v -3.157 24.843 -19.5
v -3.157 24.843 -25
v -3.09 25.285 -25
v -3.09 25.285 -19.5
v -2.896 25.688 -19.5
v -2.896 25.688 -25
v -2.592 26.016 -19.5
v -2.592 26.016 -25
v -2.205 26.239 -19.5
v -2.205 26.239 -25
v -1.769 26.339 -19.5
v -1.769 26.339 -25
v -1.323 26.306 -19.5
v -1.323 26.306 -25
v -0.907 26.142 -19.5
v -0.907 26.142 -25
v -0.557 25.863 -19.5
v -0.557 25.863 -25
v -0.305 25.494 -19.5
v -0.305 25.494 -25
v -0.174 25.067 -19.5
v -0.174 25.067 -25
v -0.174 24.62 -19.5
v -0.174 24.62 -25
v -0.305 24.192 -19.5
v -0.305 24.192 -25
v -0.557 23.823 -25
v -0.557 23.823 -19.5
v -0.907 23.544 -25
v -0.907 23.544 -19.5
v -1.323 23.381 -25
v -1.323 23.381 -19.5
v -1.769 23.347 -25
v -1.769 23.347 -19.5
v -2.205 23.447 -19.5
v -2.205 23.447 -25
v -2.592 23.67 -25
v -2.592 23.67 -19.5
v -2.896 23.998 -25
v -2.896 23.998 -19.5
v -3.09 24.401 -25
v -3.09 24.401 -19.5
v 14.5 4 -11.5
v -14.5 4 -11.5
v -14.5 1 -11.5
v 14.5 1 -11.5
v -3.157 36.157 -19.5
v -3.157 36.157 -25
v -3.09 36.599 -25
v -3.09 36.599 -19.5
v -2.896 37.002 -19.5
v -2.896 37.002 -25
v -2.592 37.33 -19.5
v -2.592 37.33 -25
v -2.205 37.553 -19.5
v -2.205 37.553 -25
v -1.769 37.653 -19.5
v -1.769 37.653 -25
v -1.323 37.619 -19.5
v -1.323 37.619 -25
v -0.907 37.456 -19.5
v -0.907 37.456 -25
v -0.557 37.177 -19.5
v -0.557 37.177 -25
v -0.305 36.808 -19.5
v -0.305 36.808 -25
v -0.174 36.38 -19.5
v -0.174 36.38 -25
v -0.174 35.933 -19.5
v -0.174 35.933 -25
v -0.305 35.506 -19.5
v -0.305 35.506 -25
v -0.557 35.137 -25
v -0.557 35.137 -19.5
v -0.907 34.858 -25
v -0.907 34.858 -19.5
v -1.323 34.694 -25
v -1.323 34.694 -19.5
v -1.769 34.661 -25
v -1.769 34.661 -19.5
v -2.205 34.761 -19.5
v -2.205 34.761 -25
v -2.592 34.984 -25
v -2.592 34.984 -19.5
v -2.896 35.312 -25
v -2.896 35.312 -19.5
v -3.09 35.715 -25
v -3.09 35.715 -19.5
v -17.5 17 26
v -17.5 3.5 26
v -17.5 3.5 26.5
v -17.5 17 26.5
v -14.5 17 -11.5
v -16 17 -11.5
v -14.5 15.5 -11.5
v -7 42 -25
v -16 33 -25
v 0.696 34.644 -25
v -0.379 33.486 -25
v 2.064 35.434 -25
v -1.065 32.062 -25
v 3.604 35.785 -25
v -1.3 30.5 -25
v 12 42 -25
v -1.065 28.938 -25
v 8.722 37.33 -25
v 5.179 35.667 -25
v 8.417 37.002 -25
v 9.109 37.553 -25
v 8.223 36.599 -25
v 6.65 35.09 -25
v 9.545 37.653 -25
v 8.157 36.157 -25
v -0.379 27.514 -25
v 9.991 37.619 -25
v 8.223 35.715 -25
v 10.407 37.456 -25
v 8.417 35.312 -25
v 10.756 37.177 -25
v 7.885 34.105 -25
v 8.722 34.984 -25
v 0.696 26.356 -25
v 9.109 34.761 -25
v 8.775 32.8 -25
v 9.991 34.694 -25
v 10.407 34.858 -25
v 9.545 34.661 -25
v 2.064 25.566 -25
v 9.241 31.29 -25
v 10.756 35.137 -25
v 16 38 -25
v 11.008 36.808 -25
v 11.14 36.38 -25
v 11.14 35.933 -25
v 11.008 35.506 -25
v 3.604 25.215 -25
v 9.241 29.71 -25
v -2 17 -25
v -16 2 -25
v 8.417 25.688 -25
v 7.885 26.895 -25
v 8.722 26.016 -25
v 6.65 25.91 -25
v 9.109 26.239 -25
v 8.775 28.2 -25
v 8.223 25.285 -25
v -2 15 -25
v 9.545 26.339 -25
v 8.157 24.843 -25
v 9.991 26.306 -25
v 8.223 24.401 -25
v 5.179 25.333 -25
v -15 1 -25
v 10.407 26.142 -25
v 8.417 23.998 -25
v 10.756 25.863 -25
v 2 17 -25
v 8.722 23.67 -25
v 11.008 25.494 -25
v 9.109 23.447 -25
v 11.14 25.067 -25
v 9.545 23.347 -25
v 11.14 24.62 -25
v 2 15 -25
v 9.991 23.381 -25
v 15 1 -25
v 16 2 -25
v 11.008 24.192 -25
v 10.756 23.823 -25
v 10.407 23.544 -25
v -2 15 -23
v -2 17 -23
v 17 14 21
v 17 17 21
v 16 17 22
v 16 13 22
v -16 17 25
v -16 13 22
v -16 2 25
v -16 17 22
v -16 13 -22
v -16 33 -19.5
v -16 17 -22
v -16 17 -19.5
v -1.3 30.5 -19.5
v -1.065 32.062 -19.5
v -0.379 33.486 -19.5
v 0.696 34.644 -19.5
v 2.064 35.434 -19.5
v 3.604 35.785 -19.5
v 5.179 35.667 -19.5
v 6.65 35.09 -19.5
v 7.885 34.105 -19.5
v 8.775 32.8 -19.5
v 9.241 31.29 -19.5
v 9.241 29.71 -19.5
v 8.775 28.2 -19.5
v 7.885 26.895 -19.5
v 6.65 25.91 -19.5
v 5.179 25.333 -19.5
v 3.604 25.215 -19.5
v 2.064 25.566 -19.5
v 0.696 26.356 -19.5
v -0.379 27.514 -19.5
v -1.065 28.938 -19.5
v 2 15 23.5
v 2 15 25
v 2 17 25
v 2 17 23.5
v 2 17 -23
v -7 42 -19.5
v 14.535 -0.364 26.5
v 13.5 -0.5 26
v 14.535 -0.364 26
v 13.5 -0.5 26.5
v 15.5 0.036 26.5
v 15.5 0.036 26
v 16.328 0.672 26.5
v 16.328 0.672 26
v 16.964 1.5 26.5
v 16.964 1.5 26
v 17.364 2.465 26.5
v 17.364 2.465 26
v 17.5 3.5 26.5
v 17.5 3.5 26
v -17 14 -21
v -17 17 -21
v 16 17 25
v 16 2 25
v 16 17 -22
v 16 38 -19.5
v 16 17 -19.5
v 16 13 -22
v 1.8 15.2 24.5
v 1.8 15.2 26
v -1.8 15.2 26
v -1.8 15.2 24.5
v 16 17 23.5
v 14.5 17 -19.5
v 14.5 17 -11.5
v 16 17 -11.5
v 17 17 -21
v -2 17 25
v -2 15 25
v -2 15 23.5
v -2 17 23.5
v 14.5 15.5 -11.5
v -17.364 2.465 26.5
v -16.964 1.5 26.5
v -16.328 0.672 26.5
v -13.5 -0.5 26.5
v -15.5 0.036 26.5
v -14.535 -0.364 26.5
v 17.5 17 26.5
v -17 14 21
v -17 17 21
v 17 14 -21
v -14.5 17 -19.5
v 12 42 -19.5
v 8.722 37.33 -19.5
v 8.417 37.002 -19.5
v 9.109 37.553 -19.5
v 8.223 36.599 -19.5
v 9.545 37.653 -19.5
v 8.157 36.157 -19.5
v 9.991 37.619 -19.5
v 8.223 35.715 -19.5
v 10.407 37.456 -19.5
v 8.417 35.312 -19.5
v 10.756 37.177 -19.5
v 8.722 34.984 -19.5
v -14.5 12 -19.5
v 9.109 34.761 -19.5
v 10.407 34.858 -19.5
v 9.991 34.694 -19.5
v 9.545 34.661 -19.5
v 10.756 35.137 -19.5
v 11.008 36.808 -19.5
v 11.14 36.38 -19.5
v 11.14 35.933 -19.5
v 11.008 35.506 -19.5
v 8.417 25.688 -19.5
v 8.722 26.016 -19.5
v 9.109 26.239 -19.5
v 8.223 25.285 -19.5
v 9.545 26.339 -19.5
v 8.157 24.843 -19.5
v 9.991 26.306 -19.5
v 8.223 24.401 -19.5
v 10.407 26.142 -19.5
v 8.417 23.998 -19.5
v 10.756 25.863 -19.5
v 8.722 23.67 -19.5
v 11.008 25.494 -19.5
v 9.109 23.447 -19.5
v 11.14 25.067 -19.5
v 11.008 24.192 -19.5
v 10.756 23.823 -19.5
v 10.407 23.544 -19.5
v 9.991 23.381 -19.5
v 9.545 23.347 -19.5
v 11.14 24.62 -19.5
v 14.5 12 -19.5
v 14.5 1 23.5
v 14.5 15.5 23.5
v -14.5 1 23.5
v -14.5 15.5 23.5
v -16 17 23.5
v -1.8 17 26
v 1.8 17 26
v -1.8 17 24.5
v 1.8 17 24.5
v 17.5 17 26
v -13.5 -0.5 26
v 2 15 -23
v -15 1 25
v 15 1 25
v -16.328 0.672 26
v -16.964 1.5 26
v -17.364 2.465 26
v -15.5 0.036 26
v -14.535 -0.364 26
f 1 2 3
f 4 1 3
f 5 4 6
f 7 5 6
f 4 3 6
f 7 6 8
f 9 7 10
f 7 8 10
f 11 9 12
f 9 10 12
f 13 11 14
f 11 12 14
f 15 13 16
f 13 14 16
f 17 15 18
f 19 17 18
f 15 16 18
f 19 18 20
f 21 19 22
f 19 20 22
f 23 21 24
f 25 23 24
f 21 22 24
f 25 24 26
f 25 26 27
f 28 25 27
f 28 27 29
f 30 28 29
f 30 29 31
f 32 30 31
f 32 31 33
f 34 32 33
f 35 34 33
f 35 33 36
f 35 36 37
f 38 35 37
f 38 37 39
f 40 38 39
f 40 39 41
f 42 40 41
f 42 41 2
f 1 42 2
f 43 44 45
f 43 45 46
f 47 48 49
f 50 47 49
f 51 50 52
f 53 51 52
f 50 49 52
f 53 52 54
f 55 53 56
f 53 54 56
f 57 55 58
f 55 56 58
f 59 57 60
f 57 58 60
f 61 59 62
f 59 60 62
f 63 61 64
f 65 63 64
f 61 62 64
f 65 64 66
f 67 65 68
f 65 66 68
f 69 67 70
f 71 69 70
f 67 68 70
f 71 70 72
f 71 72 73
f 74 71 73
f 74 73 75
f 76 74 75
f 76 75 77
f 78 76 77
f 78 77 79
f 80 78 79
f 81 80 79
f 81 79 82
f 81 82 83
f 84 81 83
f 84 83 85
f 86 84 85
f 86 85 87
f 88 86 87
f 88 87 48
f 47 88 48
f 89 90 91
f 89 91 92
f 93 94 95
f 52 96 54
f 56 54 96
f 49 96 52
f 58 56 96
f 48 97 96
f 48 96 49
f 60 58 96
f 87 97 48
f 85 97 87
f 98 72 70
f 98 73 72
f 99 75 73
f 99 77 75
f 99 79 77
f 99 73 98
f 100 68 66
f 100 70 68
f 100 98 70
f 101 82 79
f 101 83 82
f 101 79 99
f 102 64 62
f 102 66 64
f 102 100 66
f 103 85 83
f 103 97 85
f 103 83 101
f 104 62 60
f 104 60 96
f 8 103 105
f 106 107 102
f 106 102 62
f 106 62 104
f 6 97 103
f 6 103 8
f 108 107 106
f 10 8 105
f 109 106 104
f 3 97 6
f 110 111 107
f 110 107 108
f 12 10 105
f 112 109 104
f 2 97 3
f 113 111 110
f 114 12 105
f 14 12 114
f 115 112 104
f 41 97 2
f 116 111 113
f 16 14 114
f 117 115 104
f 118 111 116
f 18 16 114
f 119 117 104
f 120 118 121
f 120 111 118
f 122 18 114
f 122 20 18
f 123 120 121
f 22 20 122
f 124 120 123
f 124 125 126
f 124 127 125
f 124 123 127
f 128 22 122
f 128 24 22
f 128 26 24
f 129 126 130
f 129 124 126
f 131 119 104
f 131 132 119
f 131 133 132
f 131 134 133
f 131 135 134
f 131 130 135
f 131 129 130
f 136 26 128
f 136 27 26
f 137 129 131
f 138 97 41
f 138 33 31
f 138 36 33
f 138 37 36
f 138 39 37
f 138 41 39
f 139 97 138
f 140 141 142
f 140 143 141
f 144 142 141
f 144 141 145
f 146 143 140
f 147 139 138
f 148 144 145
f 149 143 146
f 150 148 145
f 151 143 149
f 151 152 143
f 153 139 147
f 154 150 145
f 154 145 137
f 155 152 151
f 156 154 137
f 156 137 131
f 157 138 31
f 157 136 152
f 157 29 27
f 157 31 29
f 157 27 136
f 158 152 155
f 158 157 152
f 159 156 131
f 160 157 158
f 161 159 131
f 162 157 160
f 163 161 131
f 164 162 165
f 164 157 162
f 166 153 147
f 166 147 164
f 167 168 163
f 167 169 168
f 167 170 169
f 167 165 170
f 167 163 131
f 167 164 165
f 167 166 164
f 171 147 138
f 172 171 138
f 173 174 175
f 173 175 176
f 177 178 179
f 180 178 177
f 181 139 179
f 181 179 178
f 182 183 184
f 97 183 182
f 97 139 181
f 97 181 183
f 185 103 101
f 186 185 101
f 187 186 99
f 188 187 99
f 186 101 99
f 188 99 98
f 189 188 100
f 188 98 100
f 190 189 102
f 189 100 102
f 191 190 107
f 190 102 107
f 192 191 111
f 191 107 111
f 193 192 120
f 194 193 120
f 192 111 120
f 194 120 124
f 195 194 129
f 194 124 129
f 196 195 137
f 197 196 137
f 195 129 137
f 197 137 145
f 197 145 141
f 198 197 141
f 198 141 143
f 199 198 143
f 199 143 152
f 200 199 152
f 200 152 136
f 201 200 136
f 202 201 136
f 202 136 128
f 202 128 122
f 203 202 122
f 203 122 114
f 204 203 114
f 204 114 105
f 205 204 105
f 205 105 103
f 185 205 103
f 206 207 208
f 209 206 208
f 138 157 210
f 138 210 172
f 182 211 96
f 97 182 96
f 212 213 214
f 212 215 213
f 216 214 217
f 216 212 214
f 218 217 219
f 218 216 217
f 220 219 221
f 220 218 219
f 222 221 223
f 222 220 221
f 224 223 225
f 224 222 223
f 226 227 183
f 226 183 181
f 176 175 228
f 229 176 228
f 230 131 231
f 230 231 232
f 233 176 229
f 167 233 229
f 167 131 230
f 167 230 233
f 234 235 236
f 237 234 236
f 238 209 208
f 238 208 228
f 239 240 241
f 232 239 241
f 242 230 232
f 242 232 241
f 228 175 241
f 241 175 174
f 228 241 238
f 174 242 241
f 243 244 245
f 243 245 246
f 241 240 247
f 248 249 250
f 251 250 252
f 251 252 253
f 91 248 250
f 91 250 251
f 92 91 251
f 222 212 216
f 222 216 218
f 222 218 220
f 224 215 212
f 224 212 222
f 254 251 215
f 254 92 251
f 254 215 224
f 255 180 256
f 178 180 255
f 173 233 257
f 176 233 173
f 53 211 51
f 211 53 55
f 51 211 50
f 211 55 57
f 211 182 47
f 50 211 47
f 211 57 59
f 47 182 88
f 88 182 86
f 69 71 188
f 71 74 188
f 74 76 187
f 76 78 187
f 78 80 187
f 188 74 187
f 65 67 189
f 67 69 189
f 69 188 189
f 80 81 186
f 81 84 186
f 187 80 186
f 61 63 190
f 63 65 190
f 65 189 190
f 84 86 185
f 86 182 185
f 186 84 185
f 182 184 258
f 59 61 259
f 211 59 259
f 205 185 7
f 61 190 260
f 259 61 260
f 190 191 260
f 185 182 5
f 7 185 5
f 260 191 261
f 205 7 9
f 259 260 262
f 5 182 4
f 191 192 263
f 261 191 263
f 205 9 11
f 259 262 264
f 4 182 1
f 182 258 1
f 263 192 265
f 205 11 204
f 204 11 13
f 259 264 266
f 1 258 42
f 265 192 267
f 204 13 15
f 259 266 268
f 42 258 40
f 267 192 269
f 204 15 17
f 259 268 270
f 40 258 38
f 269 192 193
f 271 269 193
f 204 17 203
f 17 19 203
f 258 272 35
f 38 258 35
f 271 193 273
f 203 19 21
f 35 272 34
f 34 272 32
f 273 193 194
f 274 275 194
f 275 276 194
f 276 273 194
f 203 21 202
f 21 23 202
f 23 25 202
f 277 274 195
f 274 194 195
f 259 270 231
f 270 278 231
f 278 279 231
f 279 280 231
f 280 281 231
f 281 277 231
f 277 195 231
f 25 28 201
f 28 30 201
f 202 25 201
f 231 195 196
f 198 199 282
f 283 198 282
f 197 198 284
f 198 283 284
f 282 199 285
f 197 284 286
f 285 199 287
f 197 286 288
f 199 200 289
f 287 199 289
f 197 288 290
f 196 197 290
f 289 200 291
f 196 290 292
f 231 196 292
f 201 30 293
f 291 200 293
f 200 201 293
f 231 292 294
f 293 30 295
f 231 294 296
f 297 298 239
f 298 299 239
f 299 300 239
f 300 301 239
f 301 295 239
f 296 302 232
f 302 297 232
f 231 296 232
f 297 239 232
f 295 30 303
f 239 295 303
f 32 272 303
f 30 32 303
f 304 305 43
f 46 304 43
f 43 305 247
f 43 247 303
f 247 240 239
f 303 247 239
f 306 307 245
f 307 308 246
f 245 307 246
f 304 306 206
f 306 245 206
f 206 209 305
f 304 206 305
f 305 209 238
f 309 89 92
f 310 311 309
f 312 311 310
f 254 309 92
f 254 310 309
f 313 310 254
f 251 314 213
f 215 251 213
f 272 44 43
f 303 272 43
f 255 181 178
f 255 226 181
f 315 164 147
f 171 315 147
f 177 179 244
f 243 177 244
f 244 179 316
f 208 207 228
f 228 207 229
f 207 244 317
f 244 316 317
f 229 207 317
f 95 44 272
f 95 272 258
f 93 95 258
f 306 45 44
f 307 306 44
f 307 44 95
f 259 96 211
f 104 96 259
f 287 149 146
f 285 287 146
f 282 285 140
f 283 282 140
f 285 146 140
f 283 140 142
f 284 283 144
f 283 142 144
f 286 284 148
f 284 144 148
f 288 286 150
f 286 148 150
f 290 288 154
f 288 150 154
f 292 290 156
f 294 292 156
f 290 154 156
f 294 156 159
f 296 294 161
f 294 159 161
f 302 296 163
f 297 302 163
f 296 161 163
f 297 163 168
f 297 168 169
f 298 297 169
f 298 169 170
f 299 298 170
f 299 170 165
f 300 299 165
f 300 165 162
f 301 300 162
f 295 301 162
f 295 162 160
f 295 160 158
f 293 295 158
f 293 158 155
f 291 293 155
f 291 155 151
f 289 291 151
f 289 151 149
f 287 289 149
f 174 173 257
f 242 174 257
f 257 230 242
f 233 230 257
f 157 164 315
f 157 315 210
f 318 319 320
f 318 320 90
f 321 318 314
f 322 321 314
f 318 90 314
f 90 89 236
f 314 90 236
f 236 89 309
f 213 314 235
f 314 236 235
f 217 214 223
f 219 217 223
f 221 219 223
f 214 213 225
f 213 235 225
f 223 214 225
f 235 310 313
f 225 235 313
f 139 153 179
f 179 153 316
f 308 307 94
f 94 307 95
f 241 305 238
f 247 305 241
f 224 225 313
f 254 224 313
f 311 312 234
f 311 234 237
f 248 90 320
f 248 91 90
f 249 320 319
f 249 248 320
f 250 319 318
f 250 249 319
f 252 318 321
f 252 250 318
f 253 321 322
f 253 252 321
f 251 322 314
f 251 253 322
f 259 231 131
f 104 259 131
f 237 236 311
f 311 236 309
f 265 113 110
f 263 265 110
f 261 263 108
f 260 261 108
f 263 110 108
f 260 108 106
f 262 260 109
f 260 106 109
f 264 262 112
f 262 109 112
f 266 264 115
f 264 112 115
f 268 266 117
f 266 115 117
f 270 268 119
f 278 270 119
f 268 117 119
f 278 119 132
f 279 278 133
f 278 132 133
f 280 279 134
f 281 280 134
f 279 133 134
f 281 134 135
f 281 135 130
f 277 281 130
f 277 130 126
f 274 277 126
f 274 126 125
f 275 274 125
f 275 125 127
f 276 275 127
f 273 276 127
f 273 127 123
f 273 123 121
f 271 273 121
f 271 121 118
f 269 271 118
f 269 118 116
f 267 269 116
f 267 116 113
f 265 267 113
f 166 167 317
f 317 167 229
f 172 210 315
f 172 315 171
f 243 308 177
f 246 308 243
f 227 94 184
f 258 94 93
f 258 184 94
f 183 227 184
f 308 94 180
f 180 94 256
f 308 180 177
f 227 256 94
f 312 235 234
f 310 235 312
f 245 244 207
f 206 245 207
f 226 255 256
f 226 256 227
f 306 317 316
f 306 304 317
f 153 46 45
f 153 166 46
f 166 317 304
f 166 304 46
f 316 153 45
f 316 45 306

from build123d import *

# Parameters (mm, degrees)
SZKIC1_W                    = 34
SZKIC1_H                    = 50
DODANIE_WYCI_GNI_CIE1_DEPTH = 17
SZKIC3_W                    = 34
SZKIC3_H                    = 5.5
DODANIE_WYCI_GNI_CIE2_DEPTH = 25
SZKIC4_R                    = 1.5
SZKIC4_R_2                  = 5.3
WYTNIJ_WYCI_GNI_CIE2_DEPTH  = 25
SFAZOWANIE1_SIZE            = 10
SFAZOWANIE2_SIZE            = 5
WYTNIJ_WYCI_GNI_CIE3_START  = -50
WYTNIJ_WYCI_GNI_CIE3_DEPTH  = 50
SFAZOWANIE3_SIZE            = 1
SFAZOWANIE4_SIZE            = 1
SZKIC7_W                    = 35
SZKIC7_H                    = 17.5
DODANIE_WYCI_GNI_CIE3_DEPTH = 0.5
ZAOKR_GLENIE3_R             = 4
SZKIC8_W                    = 1
SZKIC8_H                    = 3
WYTNIJ_WYCI_GNI_CIE4_DEPTH  = 68
SFAZOWANIE6_SIZE            = 1
SZKIC9_W                    = 29
SZKIC9_H                    = 35
WYTNIJ_WYCI_GNI_CIE5_DEPTH  = 68
SFAZOWANIE7_SIZE            = 1.5
SZKIC10_W                   = 4
SZKIC10_H                   = 4
WYTNIJ_WYCI_GNI_CIE6_DEPTH  = 10
SZKIC11_W                   = 3.6
SZKIC11_H                   = 1.8
DODANIE_WYCI_GNI_CIE4_DEPTH = 1.5
SZKIC12_W                   = 29
SZKIC12_H                   = 10
WYTNIJ_WYCI_GNI_CIE7_DEPTH  = 8
SFAZOWANIE8_SIZE            = 8
SZKIC13_W                   = 4
SZKIC13_H                   = 2
WYTNIJ_WYCI_GNI_CIE8_DEPTH  = 2


# Read off the part's stored shape, not the designer's step: Wytnij-wyciągnięcie3
with BuildPart() as part:
    # Szkic1 → Dodanie-wyciągnięcie1 (new body)
    with BuildSketch(Plane(origin=(0, 0, 0), x_dir=(1, 0, 0), z_dir=(0, 1, 0))):
        Rectangle(SZKIC1_W, SZKIC1_H)
    extrude(amount=DODANIE_WYCI_GNI_CIE1_DEPTH)

    # Szkic3 → Dodanie-wyciągnięcie2 (add)
    with BuildSketch(Plane(origin=(0, 17, 0), x_dir=(1, 0, 0), z_dir=(0, 1, 0))):
        with Locations((0, 22.25)):
            Rectangle(SZKIC3_W, SZKIC3_H)
    extrude(amount=DODANIE_WYCI_GNI_CIE2_DEPTH)

    # Szkic4 → Wytnij-wyciągnięcie2 (cut)
    with BuildSketch(Plane(origin=(0, 0, -25), x_dir=(-1, 0, 0), z_dir=(0, 0, -1))):
        with Locations((1.656854249, 36.156854249)):
            Circle(SZKIC4_R)
        with Locations((-4, 30.5)):
            Circle(SZKIC4_R_2)
        with Locations((-9.656854249, 36.156854249)):
            Circle(SZKIC4_R)
        with Locations((1.656854249, 24.843145751)):
            Circle(SZKIC4_R)
        with Locations((-9.656854249, 24.843145751)):
            Circle(SZKIC4_R)
    extrude(amount=-WYTNIJ_WYCI_GNI_CIE2_DEPTH, mode=Mode.SUBTRACT)

    # Sfazowanie1
    sfazowanie1_edges = [part.edges().sort_by_distance(p)[0] for p in [
        (-17, 42, -22.25),
    ]]
    chamfer(sfazowanie1_edges, length=SFAZOWANIE1_SIZE)

    # Sfazowanie2
    sfazowanie2_edges = [part.edges().sort_by_distance(p)[0] for p in [
        (17, 42, -22.25),
    ]]
    chamfer(sfazowanie2_edges, length=SFAZOWANIE2_SIZE)

    # Wytnij-wyciągnięcie3 outline → Wytnij-wyciągnięcie3 (cut)
    with BuildSketch(Plane.XY.offset(25).offset(WYTNIJ_WYCI_GNI_CIE3_START)):
        Polygon((16, 38), (16, 17), (17, 17), (17, 37), align=None)
        Polygon((-17, 17), (-16, 17), (-16, 33), (-17, 32), align=None)
        Polygon((17, 0), (17, 14), (16, 14), (16, 1), (-16, 1), (-16, 14), (-17, 14), (-17, 0), align=None)
    extrude(amount=WYTNIJ_WYCI_GNI_CIE3_DEPTH, mode=Mode.SUBTRACT)

    # Sfazowanie3
    sfazowanie3_edges = [part.edges().sort_by_distance(p)[0] for p in [
        (-16, 14, 0),
        (16, 14, 0),
    ]]
    chamfer(sfazowanie3_edges, length=SFAZOWANIE3_SIZE - 0.0001)  # a hair under: the kernel refuses the full size

    # Sfazowanie4
    sfazowanie4_edges = [part.edges().sort_by_distance(p)[0] for p in [
        (-16, 1, 0),
        (16, 1, 0),
    ]]
    chamfer(sfazowanie4_edges, length=SFAZOWANIE4_SIZE)

    # Szkic8 → Wytnij-wyciągnięcie4 (cut)
    with BuildSketch(Plane(origin=(0, 17, 0), x_dir=(1, 0, 0), z_dir=(0, 1, 0))):
        with Locations((-16.5, 23.5)):
            Rectangle(SZKIC8_W, SZKIC8_H)
        with Locations((16.5, 23.5)):
            Rectangle(SZKIC8_W, SZKIC8_H)
        with Locations((-16.5, -23.5)):
            Rectangle(SZKIC8_W, SZKIC8_H)
        with Locations((16.5, -23.5)):
            Rectangle(SZKIC8_W, SZKIC8_H)
    extrude(amount=-WYTNIJ_WYCI_GNI_CIE4_DEPTH, mode=Mode.SUBTRACT)

    # Sfazowanie6
    sfazowanie6_edges = [part.edges().sort_by_distance(p)[0] for p in [
        (-17, 15.5, -22),
        (17, 15.5, -22),
        (17, 15.5, 22),
        (-17, 15.5, 22),
    ]]
    chamfer(sfazowanie6_edges, length=SFAZOWANIE6_SIZE - 0.0001)  # a hair under: the kernel refuses the full size

    # Szkic9 → Wytnij-wyciągnięcie5 (cut)
    with BuildSketch(Plane(origin=(0, 17, 0), x_dir=(1, 0, 0), z_dir=(0, 1, 0))):
        with Locations((0, -6)):
            Rectangle(SZKIC9_W, SZKIC9_H)
    extrude(amount=-WYTNIJ_WYCI_GNI_CIE5_DEPTH, mode=Mode.SUBTRACT)

    # Sfazowanie7
    sfazowanie7_edges = [part.edges().sort_by_distance(p)[0] for p in [
        (-14.5, 17, 6),
        (14.5, 17, 6),
    ]]
    chamfer(sfazowanie7_edges, length=SFAZOWANIE7_SIZE - 0.0001)  # a hair under: the kernel refuses the full size

    # Szkic10 → Wytnij-wyciągnięcie6 (cut)
    with BuildSketch(Plane.XY.offset(25)):
        with Locations((0, 17)):
            Rectangle(SZKIC10_W, SZKIC10_H)
    extrude(amount=-WYTNIJ_WYCI_GNI_CIE6_DEPTH, mode=Mode.SUBTRACT)

    # Szkic12 → Wytnij-wyciągnięcie7 (cut)
    with BuildSketch(Plane.XY.offset(-11.5)):
        with Locations((0, 17)):
            Rectangle(SZKIC12_W, SZKIC12_H)
    extrude(amount=-WYTNIJ_WYCI_GNI_CIE7_DEPTH, mode=Mode.SUBTRACT)

    # Sfazowanie8
    sfazowanie8_edges = [part.edges().sort_by_distance(p)[0] for p in [
        (0, 12, -11.5),
    ]]
    chamfer(sfazowanie8_edges, length=SFAZOWANIE8_SIZE - 0.0001)  # a hair under: the kernel refuses the full size

    # Szkic13 → Wytnij-wyciągnięcie8 (cut)
    with BuildSketch(Plane(origin=(0, 0, -25), x_dir=(-1, 0, 0), z_dir=(0, 0, -1))):
        with Locations((0, 16)):
            Rectangle(SZKIC13_W, SZKIC13_H)
    extrude(amount=-WYTNIJ_WYCI_GNI_CIE8_DEPTH, mode=Mode.SUBTRACT)


with BuildPart() as body_2:
    # Szkic7 → Dodanie-wyciągnięcie3 (new body)
    with BuildSketch(Plane.XY.offset(26)):
        with Locations((0, 8.25)):
            Rectangle(SZKIC7_W, SZKIC7_H)
    extrude(amount=DODANIE_WYCI_GNI_CIE3_DEPTH)

    # Zaokrąglenie3
    zaokr_glenie3_edges = [body_2.edges().sort_by_distance(p)[0] for p in [
        (17.5, -0.5, 26.25),
        (-17.5, -0.5, 26.25),
    ]]
    fillet(zaokr_glenie3_edges, radius=ZAOKR_GLENIE3_R)

    # Szkic11 → Dodanie-wyciągnięcie4 (add)
    with BuildSketch(Plane(origin=(0, 0, 26), x_dir=(-1, 0, 0), z_dir=(0, 0, -1))):
        with Locations((0, 16.1)):
            Rectangle(SZKIC11_W, SZKIC11_H)
    extrude(amount=DODANIE_WYCI_GNI_CIE4_DEPTH)


solid = Compound([part.part, body_2.part])
